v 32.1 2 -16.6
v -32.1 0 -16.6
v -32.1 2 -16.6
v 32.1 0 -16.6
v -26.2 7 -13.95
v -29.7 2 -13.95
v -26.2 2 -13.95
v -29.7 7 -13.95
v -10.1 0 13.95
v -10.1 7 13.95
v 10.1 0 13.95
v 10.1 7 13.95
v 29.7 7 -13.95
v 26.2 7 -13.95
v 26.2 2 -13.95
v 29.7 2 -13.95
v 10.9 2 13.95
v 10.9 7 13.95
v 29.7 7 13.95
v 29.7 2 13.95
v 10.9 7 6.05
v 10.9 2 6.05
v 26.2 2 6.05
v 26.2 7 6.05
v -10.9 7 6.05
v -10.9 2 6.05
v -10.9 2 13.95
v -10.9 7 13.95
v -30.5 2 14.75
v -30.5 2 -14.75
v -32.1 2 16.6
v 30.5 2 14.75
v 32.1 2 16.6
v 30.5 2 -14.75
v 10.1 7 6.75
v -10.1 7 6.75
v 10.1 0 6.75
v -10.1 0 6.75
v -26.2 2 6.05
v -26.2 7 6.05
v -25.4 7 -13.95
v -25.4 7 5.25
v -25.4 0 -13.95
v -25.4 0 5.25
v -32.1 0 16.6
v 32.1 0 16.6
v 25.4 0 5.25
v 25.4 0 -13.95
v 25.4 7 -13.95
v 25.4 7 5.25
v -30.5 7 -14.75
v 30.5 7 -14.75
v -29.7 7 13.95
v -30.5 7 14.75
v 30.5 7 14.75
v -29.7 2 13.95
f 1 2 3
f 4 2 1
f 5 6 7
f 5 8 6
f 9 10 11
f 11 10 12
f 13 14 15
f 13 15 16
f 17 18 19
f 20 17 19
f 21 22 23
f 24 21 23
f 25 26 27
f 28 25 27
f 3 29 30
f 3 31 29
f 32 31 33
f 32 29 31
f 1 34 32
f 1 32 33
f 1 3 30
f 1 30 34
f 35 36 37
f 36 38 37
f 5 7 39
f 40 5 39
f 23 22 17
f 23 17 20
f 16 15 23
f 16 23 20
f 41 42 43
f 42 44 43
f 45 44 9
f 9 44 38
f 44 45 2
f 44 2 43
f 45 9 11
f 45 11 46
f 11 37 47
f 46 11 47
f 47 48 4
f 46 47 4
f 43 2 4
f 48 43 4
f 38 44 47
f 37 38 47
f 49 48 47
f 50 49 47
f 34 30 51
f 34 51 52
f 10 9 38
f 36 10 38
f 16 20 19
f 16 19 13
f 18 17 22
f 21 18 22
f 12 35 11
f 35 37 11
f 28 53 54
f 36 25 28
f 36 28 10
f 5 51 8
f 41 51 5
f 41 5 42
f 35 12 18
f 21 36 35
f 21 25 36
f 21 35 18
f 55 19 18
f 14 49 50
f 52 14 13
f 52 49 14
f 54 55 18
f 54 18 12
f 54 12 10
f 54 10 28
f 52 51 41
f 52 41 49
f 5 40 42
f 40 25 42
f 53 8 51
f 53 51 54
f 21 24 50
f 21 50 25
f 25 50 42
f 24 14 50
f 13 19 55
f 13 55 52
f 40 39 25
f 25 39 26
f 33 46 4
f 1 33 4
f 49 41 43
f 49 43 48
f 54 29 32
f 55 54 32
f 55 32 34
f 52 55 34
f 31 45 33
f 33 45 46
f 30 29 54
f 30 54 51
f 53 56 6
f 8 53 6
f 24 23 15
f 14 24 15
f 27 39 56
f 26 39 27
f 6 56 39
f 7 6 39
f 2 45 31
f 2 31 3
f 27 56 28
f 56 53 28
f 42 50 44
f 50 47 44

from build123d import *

# Parameters (mm, degrees)
SKETCH_1_W          = 64.2
SKETCH_1_H          = 33.2
EXTRUDE_1_DEPTH     = 2
SKETCH_2_W          = 61
SKETCH_2_H          = 29.5
SKETCH_2_W_2        = 59.4
SKETCH_2_H_2        = 27.9
EXTRUDE_2_DEPTH     = 5
OTHER_START         = -13.95
OTHER_1_OUTLINE_W   = 50.8
OTHER_1_OUTLINE_H   = 2
OTHER_1_DEPTH       = 19.2
OTHER_START_2       = 6.75
OTHER_1_2_OUTLINE_W = 20.2
OTHER_1_2_OUTLINE_H = 2
OTHER_1_2_DEPTH     = 7.2
EXTRUDE_6_DEPTH     = 5


# Read off the part's stored shape, not the designer's step: Полость1
with BuildPart() as part:
    # Эскиз1 → Бобышка-Вытянуть1 (new body)
    with BuildSketch(Plane(origin=(0, 0, 0), x_dir=(1, 0, 0), z_dir=(0, 1, 0))):
        Rectangle(SKETCH_1_W, SKETCH_1_H)
    extrude(amount=EXTRUDE_1_DEPTH)

    # Эскиз2 → Бобышка-Вытянуть2 (add)
    with BuildSketch(Plane(origin=(0, 2, 0), x_dir=(1, 0, 0), z_dir=(0, 1, 0))):
        Rectangle(SKETCH_2_W, SKETCH_2_H)
        Rectangle(SKETCH_2_W_2, SKETCH_2_H_2, mode=Mode.SUBTRACT)
    extrude(amount=EXTRUDE_2_DEPTH)

    # Полость1 outline → Полость1 (cut)
    with BuildSketch(Plane.XY.offset(OTHER_START)):
        with Locations((0, 1)):
            Rectangle(OTHER_1_OUTLINE_W, OTHER_1_OUTLINE_H)
    extrude(amount=OTHER_1_DEPTH, mode=Mode.SUBTRACT)

    # Other 1 2 outline → Other 1 2 (cut)
    with BuildSketch(Plane.XY.offset(OTHER_START_2)):
        with Locations((0, 1)):
            Rectangle(OTHER_1_2_OUTLINE_W, OTHER_1_2_OUTLINE_H)
    extrude(amount=OTHER_1_2_DEPTH, mode=Mode.SUBTRACT)

    # Эскиз8 → Бобышка-Вытянуть6 (add)
    with BuildSketch(Plane(origin=(0, 2, 0), x_dir=(1, 0, 0), z_dir=(0, 1, 0))):
        Polygon((-26.2, 13.95), (-26.2, -6.05), (-10.9, -6.05), (-10.9, -13.95), (-10.1, -13.95), (-10.1, -6.75), (10.1, -6.75), (10.1, -13.95), (10.9, -13.95), (10.9, -6.05), (26.2, -6.05), (26.2, 13.95), (25.4, 13.95), (25.4, -5.25), (-25.4, -5.25), (-25.4, 13.95), align=None)
    extrude(amount=EXTRUDE_6_DEPTH)


solid = part.part
